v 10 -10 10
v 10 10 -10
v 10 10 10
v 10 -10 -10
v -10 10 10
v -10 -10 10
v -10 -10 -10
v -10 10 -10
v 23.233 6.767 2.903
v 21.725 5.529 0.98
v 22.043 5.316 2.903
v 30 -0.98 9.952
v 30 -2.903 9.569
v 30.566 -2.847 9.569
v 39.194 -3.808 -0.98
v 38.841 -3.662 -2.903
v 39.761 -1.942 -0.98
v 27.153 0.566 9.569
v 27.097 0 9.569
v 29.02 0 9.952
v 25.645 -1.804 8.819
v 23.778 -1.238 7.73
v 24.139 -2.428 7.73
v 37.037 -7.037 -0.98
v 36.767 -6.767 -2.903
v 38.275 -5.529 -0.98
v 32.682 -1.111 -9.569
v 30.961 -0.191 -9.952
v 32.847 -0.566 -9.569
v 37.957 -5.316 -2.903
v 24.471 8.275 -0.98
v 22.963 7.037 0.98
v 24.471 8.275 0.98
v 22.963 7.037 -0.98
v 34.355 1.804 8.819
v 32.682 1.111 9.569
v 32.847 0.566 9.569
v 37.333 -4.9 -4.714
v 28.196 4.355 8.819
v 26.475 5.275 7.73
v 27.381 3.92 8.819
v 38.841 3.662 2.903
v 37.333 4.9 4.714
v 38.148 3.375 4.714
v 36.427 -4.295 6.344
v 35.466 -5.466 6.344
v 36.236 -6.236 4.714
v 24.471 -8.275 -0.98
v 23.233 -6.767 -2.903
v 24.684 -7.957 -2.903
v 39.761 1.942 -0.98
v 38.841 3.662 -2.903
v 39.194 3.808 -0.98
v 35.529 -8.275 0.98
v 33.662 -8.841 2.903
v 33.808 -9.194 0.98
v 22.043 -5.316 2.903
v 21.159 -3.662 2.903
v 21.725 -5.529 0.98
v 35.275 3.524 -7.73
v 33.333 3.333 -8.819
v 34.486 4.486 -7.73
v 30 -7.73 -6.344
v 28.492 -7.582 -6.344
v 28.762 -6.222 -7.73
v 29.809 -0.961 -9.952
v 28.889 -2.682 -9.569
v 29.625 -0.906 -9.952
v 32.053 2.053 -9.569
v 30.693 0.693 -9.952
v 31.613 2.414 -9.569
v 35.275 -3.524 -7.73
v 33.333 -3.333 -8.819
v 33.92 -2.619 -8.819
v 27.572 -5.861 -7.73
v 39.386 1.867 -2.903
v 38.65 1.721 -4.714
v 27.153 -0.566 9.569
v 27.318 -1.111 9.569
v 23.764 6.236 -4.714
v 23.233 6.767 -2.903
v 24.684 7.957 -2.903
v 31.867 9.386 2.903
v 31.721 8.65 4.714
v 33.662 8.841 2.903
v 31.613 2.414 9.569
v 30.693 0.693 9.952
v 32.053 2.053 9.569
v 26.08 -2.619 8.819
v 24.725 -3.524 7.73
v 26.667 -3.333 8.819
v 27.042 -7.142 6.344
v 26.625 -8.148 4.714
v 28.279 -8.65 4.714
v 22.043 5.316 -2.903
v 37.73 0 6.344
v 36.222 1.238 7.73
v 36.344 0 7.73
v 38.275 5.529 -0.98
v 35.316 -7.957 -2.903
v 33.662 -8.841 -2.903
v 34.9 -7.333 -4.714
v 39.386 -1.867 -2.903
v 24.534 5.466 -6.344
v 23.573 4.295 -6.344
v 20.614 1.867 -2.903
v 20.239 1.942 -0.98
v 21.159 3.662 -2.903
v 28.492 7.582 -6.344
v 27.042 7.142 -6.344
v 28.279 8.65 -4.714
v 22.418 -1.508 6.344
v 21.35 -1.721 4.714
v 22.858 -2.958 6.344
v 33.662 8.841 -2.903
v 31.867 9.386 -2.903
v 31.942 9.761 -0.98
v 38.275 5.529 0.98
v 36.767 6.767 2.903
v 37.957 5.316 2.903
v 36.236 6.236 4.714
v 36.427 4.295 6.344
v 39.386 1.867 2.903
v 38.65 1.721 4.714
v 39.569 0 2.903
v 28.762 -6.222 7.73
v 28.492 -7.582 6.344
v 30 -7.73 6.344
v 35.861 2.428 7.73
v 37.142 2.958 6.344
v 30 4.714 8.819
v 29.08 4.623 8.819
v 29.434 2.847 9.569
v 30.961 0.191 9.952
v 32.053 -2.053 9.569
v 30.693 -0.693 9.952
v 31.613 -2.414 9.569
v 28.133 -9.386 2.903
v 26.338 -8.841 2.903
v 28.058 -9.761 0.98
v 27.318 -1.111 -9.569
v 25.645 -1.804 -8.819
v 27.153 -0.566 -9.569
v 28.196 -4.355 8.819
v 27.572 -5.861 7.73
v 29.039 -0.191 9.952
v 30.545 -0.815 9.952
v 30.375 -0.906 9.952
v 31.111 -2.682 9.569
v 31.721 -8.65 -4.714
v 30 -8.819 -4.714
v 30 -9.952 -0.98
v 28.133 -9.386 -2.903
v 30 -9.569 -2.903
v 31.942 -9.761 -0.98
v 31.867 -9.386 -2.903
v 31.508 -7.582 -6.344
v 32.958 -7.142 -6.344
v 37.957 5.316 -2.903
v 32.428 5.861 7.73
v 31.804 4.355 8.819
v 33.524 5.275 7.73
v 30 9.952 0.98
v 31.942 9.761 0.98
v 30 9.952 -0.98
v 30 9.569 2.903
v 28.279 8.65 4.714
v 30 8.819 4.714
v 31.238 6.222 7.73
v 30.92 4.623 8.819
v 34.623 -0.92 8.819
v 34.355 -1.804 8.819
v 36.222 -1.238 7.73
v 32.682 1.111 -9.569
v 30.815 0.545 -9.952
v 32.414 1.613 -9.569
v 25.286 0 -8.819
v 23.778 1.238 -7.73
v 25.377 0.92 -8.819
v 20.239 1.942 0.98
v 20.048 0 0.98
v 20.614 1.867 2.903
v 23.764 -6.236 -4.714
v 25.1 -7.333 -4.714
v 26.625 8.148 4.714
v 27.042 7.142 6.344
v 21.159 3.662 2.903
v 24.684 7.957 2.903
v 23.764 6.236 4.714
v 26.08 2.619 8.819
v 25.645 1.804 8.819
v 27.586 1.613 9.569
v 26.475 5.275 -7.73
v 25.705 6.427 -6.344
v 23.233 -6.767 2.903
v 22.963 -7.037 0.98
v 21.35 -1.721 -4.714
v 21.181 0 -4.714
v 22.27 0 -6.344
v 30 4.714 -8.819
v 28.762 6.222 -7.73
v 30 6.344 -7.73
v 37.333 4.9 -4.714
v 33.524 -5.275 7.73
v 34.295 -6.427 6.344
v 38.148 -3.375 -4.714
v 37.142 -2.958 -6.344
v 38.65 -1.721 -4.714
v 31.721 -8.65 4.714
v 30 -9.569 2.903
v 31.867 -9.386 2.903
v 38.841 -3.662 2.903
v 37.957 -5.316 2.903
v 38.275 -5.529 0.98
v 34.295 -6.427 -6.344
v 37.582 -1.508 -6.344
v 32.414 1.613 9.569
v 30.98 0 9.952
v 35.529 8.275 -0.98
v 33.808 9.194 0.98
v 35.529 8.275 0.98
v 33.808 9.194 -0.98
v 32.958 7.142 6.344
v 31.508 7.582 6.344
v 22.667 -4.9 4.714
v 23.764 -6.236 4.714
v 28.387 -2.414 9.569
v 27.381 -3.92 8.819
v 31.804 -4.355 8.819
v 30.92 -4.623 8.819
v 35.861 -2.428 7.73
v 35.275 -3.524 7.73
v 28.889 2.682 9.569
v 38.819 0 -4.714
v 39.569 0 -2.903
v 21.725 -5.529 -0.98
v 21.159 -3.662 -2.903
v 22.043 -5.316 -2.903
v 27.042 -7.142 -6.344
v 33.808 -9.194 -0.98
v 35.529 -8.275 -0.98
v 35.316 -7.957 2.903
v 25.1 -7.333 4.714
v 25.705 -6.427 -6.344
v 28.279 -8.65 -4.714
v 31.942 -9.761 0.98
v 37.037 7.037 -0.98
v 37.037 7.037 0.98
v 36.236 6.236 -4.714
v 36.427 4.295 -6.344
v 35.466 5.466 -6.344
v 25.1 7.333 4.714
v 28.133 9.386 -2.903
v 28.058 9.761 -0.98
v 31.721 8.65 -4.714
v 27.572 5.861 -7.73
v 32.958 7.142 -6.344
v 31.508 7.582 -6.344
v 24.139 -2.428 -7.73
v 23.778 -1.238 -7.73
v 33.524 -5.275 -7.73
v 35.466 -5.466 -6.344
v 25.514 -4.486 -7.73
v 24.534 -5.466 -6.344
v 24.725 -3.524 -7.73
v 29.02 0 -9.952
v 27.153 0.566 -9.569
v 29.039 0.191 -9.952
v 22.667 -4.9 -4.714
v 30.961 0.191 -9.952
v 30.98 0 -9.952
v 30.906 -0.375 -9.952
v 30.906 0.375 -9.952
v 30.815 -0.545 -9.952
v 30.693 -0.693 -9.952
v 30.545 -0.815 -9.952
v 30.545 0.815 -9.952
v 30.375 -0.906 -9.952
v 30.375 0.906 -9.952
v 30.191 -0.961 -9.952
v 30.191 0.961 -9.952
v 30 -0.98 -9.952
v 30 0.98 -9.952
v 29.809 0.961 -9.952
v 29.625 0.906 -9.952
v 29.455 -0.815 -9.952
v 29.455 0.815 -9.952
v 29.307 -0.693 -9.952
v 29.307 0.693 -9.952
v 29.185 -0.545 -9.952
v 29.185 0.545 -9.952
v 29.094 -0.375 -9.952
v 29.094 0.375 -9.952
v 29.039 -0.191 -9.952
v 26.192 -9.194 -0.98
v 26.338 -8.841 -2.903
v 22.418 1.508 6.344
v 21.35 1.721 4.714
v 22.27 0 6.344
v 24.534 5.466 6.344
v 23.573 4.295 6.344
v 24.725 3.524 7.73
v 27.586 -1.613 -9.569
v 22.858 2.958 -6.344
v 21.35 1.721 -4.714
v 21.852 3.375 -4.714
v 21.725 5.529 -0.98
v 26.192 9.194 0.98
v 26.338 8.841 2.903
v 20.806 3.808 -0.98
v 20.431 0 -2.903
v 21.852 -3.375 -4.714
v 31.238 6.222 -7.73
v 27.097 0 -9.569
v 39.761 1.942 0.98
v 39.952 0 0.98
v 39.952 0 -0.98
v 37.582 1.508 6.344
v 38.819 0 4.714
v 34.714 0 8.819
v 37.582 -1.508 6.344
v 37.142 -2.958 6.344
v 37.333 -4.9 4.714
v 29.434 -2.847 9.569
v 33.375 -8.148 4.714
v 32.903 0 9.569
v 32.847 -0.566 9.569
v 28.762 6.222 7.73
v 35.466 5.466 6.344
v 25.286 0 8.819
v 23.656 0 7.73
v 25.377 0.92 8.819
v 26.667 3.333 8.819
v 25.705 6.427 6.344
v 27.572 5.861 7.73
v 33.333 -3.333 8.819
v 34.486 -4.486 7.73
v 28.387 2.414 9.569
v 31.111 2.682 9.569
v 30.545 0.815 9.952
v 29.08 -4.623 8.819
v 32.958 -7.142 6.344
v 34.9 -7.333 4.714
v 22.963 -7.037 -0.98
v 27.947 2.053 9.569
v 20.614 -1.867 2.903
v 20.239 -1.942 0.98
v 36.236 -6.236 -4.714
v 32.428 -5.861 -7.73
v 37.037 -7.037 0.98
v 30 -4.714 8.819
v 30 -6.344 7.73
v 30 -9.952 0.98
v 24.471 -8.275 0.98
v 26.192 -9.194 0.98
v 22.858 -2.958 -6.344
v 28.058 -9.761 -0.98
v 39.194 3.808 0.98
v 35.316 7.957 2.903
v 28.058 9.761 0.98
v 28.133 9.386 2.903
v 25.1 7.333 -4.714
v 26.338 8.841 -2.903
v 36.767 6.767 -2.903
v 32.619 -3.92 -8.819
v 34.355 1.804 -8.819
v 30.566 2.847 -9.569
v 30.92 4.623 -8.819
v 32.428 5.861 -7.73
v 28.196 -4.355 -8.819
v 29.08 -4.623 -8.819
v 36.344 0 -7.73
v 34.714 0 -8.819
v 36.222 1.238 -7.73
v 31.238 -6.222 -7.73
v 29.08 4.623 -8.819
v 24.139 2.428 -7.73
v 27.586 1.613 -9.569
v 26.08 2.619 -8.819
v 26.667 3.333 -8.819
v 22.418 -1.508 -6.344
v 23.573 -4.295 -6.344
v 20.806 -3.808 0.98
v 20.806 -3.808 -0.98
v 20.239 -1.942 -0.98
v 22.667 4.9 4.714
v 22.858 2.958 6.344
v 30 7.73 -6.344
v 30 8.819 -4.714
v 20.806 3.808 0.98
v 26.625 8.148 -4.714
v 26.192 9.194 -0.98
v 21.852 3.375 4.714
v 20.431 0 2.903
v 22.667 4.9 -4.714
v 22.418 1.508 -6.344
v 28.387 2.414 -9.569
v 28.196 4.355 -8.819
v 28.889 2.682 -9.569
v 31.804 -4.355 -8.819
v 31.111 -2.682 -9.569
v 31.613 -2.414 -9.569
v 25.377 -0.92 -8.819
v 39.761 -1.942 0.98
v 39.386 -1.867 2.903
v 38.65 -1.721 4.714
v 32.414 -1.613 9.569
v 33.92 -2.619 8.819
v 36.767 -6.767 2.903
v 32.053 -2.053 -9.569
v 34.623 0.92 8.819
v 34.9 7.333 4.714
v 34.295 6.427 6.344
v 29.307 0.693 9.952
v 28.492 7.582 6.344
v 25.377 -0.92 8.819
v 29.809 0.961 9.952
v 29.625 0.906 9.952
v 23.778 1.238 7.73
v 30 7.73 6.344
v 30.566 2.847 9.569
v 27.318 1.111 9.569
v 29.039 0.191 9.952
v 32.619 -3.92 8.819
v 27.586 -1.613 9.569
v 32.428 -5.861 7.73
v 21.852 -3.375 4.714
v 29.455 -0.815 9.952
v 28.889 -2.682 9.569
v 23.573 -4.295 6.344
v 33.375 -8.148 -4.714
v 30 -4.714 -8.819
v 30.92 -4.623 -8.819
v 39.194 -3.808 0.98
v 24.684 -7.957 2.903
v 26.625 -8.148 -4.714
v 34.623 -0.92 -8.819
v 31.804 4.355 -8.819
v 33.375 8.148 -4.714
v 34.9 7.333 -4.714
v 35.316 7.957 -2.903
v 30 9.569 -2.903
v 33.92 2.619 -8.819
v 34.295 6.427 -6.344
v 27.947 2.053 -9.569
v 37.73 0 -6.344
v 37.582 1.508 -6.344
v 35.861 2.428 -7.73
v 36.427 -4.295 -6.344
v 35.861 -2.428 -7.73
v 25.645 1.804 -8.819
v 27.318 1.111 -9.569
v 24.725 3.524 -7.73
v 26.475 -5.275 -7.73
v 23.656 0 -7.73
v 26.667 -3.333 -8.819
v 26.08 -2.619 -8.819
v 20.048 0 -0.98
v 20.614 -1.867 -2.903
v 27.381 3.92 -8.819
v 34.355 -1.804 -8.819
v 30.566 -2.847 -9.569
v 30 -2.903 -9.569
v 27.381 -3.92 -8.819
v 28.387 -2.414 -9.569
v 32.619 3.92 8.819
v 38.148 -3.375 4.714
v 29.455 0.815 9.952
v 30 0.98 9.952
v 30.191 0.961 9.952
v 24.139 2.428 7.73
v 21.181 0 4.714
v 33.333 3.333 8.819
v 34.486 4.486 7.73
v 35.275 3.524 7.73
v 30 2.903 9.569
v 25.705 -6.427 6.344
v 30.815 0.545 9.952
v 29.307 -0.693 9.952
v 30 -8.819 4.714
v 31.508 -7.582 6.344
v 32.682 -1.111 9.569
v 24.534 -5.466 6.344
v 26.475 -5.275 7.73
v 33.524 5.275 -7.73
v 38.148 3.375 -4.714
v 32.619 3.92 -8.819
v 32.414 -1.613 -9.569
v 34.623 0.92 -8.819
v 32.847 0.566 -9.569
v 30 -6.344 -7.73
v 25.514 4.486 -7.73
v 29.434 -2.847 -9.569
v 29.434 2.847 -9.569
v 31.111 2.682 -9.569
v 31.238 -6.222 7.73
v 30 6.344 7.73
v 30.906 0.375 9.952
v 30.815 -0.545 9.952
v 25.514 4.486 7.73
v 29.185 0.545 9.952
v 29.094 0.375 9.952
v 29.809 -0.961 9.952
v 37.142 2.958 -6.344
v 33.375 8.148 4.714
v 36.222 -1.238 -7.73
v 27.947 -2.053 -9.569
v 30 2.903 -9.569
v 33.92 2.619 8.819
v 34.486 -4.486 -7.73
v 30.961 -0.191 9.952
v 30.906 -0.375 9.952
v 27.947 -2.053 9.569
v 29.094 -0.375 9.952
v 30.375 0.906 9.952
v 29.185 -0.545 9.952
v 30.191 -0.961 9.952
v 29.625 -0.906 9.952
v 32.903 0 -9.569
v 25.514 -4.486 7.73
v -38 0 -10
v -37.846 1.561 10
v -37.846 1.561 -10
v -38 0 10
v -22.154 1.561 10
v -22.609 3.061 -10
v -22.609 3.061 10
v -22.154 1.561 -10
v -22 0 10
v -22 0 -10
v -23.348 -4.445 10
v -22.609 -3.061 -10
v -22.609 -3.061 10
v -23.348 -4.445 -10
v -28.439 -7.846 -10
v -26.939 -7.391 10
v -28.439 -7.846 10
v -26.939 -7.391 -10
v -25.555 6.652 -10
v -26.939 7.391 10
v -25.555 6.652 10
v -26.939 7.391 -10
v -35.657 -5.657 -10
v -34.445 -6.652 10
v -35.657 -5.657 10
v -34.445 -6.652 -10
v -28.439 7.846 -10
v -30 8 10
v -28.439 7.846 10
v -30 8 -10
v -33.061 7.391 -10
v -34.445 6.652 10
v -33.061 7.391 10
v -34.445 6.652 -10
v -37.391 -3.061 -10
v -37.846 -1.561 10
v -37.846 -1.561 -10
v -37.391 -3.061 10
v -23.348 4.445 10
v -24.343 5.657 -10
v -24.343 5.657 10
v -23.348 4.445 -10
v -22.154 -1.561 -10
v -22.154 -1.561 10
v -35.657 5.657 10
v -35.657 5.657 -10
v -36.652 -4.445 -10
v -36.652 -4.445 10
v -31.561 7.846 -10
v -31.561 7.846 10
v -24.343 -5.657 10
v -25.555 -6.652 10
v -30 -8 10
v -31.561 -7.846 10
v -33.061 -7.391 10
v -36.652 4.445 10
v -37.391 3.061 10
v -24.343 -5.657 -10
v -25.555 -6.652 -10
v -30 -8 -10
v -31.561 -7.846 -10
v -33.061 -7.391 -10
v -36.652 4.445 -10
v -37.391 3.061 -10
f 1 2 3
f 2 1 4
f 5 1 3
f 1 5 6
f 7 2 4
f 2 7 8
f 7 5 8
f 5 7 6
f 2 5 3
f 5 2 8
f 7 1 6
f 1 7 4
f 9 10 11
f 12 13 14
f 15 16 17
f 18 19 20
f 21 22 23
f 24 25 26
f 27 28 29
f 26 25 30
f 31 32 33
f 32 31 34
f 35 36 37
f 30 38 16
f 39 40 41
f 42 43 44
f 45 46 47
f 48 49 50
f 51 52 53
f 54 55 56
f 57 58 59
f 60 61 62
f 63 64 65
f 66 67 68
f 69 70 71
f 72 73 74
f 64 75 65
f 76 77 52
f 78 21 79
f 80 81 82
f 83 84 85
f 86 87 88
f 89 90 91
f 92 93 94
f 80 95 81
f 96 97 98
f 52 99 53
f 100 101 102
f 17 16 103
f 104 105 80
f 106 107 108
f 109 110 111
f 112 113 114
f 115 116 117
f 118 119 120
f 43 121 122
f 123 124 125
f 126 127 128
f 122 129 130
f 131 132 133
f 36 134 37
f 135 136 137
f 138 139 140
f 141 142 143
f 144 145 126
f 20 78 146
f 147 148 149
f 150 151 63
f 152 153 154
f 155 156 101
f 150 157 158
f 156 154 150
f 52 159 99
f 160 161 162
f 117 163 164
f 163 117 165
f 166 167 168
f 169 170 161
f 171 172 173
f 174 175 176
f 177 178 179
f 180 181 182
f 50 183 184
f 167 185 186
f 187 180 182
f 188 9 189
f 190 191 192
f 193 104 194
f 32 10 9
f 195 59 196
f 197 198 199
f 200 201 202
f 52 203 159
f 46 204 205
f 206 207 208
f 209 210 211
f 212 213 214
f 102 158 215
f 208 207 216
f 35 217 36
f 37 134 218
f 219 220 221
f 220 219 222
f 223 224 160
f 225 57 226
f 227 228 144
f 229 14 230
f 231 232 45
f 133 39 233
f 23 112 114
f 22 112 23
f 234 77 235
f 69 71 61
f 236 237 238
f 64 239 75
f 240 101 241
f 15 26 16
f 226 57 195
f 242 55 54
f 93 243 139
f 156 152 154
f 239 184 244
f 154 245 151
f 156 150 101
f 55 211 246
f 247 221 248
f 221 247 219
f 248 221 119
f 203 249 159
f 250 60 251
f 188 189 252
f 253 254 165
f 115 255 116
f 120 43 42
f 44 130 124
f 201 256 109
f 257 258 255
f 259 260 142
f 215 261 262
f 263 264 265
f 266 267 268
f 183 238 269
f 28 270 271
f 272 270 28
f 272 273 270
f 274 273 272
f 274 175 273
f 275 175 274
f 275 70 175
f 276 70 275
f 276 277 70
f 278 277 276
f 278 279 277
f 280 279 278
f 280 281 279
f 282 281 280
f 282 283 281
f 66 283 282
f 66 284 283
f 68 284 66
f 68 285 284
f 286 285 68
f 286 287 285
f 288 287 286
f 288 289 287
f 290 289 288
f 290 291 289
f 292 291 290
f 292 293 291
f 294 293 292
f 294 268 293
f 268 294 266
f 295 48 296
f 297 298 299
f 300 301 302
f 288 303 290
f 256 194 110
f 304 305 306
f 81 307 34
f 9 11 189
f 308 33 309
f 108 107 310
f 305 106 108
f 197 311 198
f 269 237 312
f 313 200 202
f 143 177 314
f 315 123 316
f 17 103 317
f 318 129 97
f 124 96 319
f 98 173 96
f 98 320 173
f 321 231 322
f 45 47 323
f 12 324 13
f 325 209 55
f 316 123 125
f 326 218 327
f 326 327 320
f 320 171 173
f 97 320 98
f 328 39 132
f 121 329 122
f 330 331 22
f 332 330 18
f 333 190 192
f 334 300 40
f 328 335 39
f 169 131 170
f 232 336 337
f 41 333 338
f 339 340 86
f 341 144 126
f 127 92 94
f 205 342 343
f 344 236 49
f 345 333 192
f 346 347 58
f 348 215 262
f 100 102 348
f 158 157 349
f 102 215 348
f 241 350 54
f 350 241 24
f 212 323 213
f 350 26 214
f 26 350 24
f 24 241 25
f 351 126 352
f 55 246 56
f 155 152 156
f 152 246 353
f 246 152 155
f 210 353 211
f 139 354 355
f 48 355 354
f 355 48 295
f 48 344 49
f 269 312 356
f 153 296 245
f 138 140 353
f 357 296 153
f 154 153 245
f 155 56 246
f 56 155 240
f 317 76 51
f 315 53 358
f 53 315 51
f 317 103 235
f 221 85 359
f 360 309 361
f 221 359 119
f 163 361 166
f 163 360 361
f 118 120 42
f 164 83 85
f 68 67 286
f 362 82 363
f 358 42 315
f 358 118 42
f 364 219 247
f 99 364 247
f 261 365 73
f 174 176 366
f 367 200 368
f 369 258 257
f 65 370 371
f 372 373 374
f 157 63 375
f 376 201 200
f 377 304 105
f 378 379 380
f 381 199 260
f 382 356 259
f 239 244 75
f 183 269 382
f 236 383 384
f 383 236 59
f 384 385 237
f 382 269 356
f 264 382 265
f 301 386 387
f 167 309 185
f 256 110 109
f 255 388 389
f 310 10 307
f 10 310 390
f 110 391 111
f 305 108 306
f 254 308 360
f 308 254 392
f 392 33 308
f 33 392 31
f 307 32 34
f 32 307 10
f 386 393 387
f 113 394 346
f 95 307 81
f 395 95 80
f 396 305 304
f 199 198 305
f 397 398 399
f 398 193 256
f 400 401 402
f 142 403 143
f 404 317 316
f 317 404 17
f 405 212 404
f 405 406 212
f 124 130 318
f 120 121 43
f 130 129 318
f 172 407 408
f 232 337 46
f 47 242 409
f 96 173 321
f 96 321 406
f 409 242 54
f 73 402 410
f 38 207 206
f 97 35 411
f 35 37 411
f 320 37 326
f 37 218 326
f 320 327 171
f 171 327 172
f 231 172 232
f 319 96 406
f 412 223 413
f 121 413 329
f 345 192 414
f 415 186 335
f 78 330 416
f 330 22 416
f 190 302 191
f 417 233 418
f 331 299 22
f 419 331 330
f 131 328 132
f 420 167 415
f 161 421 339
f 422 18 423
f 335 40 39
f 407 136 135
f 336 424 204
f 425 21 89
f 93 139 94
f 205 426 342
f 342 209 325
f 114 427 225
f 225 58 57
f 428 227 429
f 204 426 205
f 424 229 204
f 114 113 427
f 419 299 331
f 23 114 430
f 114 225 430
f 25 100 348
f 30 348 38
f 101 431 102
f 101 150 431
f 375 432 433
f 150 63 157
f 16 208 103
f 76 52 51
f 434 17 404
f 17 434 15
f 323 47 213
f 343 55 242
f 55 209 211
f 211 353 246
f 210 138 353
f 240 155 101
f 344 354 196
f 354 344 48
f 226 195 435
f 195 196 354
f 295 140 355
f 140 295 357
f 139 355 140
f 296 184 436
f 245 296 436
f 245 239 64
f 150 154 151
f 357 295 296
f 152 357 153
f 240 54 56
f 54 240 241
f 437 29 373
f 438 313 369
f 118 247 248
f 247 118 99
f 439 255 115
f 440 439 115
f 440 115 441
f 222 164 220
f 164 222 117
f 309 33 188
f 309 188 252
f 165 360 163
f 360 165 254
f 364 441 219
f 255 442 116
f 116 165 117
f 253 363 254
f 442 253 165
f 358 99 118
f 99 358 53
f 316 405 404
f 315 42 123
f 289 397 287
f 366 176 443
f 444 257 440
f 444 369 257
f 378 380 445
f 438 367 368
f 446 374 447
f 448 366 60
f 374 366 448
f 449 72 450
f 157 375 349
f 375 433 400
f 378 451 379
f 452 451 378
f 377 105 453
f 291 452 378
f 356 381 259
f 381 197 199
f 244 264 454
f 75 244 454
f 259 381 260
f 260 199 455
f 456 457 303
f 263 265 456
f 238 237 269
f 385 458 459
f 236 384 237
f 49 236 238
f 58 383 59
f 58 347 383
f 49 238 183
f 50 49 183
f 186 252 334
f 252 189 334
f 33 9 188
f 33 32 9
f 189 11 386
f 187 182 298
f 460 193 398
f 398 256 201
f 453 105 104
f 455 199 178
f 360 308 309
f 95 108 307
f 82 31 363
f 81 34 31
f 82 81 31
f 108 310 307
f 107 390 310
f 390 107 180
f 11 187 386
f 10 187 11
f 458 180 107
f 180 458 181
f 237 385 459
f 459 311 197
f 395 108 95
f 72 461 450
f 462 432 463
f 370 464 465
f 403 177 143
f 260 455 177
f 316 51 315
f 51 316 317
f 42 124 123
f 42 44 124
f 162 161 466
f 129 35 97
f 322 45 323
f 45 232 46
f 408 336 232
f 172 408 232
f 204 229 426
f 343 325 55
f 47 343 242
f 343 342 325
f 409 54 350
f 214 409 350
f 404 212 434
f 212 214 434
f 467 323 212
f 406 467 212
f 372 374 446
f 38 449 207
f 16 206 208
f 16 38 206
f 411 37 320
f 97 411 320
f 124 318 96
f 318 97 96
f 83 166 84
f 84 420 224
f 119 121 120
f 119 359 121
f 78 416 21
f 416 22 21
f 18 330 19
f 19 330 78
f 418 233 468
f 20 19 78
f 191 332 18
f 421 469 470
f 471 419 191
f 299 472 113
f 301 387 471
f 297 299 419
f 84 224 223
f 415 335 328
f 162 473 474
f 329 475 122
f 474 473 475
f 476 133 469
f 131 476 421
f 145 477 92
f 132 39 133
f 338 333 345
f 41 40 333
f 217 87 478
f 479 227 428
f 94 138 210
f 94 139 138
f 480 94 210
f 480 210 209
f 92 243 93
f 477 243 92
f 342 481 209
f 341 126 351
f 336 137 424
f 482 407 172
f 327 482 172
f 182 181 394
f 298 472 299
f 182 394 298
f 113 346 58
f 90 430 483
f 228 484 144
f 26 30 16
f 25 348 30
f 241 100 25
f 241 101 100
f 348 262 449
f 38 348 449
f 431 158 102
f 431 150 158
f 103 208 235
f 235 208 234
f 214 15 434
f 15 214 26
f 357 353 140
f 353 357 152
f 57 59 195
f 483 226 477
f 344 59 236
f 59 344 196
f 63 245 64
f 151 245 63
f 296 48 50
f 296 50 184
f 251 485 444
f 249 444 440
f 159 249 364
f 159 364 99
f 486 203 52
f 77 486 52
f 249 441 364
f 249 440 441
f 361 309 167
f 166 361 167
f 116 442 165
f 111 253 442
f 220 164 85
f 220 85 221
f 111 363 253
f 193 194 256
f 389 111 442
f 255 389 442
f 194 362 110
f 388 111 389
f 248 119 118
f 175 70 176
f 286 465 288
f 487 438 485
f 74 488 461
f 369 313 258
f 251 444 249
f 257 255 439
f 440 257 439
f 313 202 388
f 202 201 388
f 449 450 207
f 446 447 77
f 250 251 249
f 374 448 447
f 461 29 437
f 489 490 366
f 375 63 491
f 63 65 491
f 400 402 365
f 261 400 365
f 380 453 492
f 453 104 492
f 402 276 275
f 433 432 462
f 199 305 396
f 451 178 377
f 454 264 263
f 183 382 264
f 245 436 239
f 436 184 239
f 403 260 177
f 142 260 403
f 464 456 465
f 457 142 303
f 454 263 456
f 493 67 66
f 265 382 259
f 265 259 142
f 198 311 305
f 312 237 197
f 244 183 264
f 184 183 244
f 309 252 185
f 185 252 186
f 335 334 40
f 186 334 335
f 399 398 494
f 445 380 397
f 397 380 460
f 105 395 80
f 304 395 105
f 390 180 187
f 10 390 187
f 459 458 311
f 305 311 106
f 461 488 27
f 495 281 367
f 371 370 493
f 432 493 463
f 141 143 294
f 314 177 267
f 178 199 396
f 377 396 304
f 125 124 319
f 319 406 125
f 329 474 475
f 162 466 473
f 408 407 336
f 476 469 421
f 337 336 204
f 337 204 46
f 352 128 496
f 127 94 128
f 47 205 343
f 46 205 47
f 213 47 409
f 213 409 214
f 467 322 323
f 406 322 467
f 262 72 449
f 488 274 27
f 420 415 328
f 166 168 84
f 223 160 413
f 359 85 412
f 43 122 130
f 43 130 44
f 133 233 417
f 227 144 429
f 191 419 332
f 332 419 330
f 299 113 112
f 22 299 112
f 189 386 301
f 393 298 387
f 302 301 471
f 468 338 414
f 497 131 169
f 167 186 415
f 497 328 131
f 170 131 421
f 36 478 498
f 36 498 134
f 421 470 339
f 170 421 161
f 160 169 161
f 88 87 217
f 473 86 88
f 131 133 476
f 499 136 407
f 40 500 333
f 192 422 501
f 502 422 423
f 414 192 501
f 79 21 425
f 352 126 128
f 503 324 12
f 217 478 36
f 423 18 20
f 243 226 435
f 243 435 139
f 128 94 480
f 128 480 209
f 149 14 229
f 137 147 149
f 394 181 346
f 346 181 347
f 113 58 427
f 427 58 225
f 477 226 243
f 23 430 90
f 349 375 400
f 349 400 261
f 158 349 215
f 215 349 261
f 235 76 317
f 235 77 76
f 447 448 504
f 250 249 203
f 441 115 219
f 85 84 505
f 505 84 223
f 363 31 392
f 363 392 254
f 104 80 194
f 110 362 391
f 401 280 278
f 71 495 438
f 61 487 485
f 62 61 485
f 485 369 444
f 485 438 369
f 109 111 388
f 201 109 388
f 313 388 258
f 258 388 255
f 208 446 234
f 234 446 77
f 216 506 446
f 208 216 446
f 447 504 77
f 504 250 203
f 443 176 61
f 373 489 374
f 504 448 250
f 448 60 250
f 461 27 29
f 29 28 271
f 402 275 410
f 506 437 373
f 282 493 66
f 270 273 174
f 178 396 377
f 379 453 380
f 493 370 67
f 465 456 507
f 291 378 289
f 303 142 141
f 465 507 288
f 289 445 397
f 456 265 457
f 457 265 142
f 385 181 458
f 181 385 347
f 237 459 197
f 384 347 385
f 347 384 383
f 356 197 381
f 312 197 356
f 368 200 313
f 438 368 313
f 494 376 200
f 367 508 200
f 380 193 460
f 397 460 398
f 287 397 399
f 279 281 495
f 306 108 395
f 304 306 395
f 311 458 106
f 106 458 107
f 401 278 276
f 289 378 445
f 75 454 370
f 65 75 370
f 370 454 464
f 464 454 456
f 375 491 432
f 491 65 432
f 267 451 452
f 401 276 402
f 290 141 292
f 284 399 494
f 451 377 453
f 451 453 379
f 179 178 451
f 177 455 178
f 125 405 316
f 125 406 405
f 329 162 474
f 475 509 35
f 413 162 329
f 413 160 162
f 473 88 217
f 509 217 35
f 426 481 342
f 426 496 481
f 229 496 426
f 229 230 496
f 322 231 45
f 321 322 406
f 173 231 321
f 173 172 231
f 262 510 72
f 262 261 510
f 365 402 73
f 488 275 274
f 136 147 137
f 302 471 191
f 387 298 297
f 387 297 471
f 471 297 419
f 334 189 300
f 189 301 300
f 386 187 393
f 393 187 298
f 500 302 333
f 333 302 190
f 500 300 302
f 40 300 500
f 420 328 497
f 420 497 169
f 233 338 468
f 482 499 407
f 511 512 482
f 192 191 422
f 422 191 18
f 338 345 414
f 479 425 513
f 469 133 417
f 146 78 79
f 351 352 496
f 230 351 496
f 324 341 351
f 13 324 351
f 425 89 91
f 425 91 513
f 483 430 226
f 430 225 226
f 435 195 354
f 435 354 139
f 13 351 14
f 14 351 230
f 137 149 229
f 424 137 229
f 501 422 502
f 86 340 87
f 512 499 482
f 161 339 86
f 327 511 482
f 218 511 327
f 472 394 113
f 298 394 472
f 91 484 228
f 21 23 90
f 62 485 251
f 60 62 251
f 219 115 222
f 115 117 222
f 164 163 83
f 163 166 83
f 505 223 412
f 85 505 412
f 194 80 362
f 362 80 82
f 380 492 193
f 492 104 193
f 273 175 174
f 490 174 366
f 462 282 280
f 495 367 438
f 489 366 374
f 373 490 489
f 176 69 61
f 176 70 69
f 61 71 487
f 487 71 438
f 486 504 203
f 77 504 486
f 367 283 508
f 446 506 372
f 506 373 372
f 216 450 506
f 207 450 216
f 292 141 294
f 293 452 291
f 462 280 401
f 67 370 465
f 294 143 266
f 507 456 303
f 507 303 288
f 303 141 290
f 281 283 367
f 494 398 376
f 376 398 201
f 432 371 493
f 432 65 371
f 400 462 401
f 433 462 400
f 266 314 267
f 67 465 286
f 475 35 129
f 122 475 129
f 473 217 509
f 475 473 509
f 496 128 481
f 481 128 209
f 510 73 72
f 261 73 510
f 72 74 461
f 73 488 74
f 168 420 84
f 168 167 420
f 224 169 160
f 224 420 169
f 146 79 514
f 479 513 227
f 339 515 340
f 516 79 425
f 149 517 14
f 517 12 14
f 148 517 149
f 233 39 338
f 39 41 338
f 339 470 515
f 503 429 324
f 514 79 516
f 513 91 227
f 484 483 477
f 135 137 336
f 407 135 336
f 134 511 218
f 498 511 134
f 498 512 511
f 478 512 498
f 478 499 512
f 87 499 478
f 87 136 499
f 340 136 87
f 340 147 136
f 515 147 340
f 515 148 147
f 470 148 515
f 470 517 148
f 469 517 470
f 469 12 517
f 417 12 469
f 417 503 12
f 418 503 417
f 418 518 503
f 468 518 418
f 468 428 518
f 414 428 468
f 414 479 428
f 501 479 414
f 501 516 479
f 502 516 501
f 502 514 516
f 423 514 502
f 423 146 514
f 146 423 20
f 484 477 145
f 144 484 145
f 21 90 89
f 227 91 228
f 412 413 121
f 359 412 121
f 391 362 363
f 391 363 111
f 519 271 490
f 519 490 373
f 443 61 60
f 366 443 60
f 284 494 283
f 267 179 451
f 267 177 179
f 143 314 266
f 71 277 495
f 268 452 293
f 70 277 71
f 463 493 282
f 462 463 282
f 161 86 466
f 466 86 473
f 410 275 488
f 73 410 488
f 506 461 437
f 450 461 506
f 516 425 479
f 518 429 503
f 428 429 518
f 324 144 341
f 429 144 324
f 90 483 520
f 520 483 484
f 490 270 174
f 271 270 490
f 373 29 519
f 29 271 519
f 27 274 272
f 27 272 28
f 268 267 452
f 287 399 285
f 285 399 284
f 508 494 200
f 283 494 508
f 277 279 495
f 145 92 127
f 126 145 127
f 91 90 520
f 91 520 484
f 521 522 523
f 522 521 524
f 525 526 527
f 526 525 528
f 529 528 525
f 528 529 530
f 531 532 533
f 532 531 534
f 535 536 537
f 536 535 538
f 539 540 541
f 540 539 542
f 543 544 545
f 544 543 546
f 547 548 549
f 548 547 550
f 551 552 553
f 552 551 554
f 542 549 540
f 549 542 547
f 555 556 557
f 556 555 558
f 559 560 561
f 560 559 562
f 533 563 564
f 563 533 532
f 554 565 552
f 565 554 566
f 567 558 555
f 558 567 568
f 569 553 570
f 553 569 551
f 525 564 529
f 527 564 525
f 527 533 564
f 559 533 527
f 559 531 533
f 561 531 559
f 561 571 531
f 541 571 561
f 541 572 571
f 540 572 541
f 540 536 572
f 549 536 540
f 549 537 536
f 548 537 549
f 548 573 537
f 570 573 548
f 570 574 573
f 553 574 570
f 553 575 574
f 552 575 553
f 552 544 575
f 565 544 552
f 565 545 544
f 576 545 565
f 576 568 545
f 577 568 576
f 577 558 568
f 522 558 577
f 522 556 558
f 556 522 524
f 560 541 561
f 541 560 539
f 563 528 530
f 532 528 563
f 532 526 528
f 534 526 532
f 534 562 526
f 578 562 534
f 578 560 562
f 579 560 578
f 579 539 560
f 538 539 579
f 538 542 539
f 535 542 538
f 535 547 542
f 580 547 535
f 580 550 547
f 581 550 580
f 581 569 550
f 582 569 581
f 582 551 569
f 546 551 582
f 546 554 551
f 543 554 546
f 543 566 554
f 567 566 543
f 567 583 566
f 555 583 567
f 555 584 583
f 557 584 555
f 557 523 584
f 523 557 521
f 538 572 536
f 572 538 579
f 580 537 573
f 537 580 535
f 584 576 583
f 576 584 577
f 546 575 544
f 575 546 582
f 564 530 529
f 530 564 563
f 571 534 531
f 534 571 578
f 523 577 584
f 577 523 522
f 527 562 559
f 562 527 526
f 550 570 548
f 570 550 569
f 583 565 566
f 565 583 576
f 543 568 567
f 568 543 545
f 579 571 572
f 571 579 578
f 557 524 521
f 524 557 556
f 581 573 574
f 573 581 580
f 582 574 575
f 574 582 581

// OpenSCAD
// 01 — 기본 도형 세 가지
//
// OpenSCAD는 "코드로 형상을 쓰는" CAD입니다.
// 아래를 Playground에 붙여 넣고 Render를 눌러 보세요.

$fn = 32;              // 곡면을 몇 조각으로 쪼갤지. 클수록 매끄럽고 무겁다

cube([20, 20, 20], center = true);

translate([30, 0, 0])
  sphere(r = 10);

translate([-30, 0, 0])
  cylinder(h = 20, r = 8, center = true);
